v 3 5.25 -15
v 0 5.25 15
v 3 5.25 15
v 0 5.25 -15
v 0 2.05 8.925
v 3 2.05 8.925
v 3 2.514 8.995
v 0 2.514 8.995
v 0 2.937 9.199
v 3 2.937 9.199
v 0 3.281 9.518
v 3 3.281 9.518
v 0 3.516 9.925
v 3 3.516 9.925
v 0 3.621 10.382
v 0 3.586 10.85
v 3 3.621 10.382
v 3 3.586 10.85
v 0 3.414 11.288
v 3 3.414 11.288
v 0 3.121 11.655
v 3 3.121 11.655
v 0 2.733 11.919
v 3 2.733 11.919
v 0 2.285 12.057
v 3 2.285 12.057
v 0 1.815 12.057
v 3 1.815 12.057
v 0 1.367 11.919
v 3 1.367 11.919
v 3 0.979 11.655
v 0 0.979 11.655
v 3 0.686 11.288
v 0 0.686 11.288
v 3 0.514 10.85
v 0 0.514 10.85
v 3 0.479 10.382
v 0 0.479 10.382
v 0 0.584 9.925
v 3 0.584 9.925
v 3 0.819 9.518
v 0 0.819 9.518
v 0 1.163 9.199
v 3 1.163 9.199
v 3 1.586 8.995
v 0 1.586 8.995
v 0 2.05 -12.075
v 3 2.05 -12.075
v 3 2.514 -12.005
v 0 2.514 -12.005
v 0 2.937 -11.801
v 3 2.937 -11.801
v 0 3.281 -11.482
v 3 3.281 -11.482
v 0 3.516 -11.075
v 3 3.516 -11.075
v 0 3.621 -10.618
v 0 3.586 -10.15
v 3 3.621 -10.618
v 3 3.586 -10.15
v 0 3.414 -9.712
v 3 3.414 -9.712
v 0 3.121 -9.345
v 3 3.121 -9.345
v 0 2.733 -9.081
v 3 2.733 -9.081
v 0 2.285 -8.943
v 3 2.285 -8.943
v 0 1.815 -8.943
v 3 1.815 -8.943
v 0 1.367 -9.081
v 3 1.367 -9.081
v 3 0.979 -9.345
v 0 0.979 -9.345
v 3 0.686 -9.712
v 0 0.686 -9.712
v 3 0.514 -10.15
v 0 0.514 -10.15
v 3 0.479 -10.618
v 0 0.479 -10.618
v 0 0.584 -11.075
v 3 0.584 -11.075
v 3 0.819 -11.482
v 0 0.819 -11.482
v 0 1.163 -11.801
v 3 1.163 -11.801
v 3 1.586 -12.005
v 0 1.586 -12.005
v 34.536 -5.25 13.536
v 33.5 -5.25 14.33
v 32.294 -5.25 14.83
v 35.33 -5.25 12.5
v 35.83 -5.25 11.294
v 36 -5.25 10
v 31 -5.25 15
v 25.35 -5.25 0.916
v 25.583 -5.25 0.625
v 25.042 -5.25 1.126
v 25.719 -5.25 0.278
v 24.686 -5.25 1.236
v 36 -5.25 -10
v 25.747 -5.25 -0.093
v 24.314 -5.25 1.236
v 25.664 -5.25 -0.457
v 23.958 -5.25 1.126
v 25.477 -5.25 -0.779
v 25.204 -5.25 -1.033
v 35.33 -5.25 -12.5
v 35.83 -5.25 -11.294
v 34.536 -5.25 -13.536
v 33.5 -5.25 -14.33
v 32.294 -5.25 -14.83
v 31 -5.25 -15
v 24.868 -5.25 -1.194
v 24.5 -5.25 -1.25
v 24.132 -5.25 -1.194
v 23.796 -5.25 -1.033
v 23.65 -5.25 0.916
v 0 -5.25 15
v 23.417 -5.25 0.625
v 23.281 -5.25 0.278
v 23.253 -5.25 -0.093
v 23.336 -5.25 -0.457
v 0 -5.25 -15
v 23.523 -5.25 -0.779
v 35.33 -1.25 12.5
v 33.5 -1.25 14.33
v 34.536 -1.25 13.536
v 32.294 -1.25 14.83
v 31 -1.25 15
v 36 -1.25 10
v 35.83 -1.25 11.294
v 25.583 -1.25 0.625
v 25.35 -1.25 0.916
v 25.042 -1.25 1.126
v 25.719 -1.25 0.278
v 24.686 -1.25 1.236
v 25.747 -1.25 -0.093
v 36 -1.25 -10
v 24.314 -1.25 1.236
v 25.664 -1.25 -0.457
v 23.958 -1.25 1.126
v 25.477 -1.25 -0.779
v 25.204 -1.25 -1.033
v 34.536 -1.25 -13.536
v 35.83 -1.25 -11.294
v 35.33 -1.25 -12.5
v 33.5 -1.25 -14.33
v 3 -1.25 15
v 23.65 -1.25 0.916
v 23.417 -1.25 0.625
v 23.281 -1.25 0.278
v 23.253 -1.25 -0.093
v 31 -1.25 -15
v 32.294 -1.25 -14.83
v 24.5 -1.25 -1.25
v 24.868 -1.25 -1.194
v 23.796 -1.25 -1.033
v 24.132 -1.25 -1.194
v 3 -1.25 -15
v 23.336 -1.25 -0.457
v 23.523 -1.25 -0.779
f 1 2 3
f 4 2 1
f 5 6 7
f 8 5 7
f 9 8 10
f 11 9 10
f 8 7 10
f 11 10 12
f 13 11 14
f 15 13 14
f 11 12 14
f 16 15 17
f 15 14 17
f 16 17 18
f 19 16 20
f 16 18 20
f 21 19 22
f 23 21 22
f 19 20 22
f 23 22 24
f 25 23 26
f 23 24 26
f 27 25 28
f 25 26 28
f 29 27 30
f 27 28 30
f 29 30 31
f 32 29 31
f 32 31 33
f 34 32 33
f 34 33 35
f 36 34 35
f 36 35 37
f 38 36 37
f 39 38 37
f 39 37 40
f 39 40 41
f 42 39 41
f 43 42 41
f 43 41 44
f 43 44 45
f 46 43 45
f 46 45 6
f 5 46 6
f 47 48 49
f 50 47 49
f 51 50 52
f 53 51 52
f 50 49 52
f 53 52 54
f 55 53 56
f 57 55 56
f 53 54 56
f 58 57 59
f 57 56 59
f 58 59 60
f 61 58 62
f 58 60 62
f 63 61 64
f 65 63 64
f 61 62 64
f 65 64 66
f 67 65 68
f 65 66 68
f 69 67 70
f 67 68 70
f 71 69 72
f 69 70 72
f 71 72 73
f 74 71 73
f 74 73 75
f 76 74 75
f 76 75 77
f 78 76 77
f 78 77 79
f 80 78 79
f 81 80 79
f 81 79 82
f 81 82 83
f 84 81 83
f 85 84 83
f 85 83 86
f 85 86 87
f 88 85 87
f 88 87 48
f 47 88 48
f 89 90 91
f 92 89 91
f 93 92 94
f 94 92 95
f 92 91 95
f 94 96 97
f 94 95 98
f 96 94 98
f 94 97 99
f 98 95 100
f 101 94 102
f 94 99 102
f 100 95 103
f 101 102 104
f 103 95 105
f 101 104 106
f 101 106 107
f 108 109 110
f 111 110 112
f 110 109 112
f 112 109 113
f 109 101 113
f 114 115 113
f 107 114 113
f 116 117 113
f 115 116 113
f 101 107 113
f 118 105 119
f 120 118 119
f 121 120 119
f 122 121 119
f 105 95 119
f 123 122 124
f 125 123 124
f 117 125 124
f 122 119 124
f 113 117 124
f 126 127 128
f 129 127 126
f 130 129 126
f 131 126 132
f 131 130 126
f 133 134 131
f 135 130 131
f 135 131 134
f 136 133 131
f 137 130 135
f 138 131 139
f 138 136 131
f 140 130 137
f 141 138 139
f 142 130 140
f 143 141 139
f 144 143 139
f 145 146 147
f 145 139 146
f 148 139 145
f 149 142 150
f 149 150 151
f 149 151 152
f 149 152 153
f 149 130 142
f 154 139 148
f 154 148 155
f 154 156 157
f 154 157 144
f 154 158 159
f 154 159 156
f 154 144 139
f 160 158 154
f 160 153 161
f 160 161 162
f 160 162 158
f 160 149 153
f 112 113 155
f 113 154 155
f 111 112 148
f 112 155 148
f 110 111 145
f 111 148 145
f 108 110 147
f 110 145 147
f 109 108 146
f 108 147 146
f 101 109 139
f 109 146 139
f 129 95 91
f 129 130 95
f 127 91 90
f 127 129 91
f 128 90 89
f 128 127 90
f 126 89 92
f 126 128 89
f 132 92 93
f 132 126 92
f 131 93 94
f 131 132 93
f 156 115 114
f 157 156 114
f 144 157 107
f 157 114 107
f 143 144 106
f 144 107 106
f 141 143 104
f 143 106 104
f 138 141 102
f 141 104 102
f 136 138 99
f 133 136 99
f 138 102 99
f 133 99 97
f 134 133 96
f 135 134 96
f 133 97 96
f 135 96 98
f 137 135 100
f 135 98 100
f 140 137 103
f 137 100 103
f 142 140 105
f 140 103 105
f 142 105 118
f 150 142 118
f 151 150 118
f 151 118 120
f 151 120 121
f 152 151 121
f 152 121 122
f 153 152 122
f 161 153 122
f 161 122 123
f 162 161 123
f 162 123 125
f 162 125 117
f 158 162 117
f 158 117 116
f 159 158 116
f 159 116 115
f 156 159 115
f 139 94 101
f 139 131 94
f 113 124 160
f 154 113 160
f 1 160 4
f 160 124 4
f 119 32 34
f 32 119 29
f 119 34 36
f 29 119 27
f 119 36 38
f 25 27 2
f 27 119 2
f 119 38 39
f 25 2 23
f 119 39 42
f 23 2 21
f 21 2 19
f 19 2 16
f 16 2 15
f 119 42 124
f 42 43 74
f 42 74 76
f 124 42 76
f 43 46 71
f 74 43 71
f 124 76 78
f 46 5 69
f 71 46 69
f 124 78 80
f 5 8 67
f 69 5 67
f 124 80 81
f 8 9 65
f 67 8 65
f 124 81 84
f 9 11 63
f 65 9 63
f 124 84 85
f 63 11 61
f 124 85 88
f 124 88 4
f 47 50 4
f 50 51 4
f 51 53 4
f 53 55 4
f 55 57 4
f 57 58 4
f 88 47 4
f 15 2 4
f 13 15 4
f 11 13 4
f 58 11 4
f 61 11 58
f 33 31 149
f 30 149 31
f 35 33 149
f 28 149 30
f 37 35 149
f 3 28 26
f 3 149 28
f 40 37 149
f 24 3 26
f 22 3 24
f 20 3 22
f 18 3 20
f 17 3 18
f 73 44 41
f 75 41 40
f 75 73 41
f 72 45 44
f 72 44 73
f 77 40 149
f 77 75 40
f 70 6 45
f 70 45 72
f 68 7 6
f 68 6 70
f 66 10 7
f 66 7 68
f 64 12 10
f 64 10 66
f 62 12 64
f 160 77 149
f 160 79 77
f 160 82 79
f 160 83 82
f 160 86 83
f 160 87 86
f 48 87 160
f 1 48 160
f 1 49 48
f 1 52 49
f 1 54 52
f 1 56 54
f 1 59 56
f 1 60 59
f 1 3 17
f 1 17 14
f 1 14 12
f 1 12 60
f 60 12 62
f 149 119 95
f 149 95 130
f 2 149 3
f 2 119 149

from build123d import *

# Parameters (mm, degrees)
SKETCH1_W           = 30
SKETCH1_H           = 10.5
BOSS_EXTRUDE1_DEPTH = 3
SKETCH2_W           = 30
SKETCH2_H           = 4
BOSS_EXTRUDE2_DEPTH = 33
FILLET1_R           = 5
SKETCH3_R           = 1.575
CUT_EXTRUDE1_DEPTH  = 37.627346341
SKETCH4_R           = 1.575
CUT_EXTRUDE2_DEPTH  = 37.627346341
SKETCH5_R           = 1.25
CUT_EXTRUDE3_DEPTH  = 41.388736054


with BuildPart() as part:
    # Sketch1 → Boss-Extrude1 (new body)
    with BuildSketch(Plane(origin=(0, 0, 0), x_dir=(0, 0, -1), z_dir=(1, 0, 0))):
        Rectangle(SKETCH1_W, SKETCH1_H)
    extrude(amount=BOSS_EXTRUDE1_DEPTH)

    # Sketch2 → Boss-Extrude2 (add)
    with BuildSketch(Plane(origin=(3, 0, 0), x_dir=(0, 0, -1), z_dir=(1, 0, 0))):
        with Locations((0, -3.25)):
            Rectangle(SKETCH2_W, SKETCH2_H)
    extrude(amount=BOSS_EXTRUDE2_DEPTH)

    # Fillet1
    fillet1_edges = [part.edges().sort_by_distance(p)[0] for p in [
        (36, -3.25, 15),
        (36, -3.25, -15),
    ]]
    fillet(fillet1_edges, radius=FILLET1_R)

    # Sketch3 → Cut-Extrude1 (cut, through all)
    with BuildSketch(Plane(origin=(3, 0, 0), x_dir=(0, 0, -1), z_dir=(1, 0, 0))):
        with Locations((-10.5, 2.05)):
            Circle(SKETCH3_R)
    extrude(amount=-CUT_EXTRUDE1_DEPTH, mode=Mode.SUBTRACT)

    # Sketch4 → Cut-Extrude2 (cut, through all)
    with BuildSketch(Plane(origin=(3, 0, 0), x_dir=(0, 0, -1), z_dir=(1, 0, 0))):
        with Locations((10.5, 2.05)):
            Circle(SKETCH4_R)
    extrude(amount=-CUT_EXTRUDE2_DEPTH, mode=Mode.SUBTRACT)

    # Sketch5 → Cut-Extrude3 (cut, through all)
    with BuildSketch(Plane(origin=(0, -5.25, 0), x_dir=(-1, 0, 0), z_dir=(0, -1, 0))):
        with Locations(Location((-24.5, 0, 0), (0, 0, 90))):
            Circle(SKETCH5_R)
    extrude(amount=-CUT_EXTRUDE3_DEPTH, mode=Mode.SUBTRACT)


solid = part.part
